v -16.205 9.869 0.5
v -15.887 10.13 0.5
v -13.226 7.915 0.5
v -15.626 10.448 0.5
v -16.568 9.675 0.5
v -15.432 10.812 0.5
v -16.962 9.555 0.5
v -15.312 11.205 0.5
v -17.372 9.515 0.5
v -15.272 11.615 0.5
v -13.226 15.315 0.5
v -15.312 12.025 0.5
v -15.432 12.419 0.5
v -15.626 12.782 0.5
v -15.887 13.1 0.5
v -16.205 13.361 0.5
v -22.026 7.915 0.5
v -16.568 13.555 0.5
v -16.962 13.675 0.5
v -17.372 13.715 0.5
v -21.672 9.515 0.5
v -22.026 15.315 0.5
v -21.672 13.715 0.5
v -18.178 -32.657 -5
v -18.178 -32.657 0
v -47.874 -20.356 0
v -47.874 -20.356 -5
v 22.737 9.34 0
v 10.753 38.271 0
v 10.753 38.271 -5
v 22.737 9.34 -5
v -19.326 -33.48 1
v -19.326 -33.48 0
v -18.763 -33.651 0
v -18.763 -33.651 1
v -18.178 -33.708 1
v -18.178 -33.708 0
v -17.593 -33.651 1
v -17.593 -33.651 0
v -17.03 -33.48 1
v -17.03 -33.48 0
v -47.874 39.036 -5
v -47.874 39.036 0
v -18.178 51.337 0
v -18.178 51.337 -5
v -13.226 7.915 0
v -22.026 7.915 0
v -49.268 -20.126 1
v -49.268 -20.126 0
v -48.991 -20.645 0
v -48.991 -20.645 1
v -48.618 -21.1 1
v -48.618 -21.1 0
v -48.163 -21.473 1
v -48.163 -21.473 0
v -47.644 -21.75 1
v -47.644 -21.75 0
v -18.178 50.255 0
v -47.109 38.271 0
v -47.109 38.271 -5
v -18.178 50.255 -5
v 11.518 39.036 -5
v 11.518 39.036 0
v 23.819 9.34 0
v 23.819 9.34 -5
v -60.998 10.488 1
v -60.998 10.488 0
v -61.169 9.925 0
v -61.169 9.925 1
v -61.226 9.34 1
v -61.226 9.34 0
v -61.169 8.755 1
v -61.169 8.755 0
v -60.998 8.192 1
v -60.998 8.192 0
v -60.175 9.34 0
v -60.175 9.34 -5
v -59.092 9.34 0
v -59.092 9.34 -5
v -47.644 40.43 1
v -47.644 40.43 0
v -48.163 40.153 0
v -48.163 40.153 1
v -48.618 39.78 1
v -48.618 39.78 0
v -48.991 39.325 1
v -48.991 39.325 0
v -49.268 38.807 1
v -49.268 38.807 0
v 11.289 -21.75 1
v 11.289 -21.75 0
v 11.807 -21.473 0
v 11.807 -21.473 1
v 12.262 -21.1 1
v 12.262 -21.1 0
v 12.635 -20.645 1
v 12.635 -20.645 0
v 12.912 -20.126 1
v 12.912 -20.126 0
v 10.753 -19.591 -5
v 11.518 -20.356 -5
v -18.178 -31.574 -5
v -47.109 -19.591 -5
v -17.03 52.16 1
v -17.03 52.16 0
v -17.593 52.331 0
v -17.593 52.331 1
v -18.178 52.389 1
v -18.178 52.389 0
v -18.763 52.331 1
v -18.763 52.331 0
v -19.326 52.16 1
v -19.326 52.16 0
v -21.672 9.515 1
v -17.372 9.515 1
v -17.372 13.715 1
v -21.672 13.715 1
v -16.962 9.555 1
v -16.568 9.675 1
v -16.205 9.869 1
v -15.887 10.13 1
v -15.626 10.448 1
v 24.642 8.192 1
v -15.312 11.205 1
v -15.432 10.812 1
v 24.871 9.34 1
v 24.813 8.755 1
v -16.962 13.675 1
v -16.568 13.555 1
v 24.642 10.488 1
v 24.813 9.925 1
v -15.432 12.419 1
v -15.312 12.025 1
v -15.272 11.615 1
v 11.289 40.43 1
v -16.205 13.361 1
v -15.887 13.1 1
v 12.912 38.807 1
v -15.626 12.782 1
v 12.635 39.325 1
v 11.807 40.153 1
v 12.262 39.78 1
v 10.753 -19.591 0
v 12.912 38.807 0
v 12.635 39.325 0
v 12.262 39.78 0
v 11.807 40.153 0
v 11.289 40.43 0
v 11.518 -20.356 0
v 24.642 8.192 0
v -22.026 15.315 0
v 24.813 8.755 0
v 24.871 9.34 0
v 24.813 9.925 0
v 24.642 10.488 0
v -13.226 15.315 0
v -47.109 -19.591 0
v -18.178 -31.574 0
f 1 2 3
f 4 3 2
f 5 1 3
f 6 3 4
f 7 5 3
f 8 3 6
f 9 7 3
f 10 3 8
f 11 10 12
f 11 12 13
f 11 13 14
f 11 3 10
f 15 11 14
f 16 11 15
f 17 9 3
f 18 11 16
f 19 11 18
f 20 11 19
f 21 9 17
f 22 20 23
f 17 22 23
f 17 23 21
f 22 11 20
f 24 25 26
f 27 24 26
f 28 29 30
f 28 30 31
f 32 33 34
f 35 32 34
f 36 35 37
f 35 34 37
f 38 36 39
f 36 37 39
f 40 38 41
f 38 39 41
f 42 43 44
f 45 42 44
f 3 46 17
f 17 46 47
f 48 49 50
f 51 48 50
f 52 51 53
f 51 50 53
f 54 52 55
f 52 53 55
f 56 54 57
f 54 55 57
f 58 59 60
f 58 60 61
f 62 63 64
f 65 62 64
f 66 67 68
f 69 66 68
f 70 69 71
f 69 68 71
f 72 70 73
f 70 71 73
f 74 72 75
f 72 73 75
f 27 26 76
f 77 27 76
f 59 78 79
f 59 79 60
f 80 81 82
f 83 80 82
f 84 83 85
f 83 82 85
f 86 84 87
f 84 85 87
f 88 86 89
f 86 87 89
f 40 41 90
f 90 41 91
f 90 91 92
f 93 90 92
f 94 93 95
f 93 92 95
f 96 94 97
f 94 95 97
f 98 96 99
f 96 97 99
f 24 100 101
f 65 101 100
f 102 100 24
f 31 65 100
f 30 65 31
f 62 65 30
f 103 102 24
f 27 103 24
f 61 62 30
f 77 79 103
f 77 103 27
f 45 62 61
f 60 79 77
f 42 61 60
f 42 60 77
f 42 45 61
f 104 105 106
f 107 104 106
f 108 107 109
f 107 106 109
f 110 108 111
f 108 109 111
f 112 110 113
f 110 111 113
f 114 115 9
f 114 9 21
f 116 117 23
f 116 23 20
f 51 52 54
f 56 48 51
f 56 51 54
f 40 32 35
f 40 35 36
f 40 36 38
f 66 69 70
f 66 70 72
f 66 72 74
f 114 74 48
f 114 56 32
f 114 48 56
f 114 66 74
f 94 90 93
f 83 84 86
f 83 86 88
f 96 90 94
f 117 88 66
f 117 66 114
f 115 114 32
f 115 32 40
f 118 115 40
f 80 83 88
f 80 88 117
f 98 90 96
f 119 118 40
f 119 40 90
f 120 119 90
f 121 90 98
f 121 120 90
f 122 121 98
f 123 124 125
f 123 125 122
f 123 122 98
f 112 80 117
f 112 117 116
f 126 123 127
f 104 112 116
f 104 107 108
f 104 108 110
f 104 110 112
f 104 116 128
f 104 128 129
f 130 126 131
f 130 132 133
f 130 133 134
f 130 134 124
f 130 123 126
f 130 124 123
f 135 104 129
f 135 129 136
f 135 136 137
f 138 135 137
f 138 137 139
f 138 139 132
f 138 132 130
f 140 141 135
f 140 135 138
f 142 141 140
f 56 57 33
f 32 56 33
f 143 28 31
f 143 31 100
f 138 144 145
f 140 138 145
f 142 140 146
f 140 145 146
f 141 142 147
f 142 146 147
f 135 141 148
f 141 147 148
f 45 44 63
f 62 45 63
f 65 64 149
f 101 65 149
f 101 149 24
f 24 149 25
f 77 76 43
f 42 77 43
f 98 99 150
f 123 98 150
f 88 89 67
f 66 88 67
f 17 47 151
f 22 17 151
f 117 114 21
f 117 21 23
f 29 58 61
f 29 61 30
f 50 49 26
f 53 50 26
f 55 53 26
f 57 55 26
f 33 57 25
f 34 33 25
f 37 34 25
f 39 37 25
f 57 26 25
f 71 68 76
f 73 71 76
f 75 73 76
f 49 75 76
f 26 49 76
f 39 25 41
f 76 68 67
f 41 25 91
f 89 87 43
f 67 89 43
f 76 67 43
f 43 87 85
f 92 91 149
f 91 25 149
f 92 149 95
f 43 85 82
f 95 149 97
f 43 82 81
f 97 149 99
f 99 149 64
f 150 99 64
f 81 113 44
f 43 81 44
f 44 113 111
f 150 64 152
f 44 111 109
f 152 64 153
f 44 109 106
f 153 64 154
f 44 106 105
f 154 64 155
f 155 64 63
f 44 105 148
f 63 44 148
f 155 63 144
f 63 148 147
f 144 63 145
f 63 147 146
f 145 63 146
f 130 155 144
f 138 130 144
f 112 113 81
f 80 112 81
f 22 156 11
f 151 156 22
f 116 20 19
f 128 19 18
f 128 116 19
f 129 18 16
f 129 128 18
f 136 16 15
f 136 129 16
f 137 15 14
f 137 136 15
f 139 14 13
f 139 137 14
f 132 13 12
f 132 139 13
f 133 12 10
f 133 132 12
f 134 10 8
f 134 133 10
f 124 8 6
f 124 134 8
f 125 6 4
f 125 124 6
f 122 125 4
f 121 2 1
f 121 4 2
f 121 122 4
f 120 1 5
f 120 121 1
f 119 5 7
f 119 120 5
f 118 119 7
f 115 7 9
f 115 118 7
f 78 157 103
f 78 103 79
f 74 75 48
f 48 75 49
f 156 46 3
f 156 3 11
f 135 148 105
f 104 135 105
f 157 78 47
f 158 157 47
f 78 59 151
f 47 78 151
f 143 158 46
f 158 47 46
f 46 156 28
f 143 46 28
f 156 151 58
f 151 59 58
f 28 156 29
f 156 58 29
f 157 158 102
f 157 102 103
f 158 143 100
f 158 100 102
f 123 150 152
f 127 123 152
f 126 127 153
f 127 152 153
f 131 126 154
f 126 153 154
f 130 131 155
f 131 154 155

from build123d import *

# Parameters (mm, degrees)
BOSS_EXTRU_1_DEPTH      = 1
ENL_V_MAT_EXTRU_1_DEPTH = 1
BOSS_EXTRU_2_DEPTH      = 5
ESQUISSE4_W             = 8.8
ESQUISSE4_H             = 7.4
ENL_V_MAT_EXTRU_2_DEPTH = 0.5


with BuildPart() as part:
    # Esquisse1 → Boss.-Extru.1 (new body)
    with BuildSketch(Plane.XY):
        with BuildLine():
            Line((-19.325920559, 52.160343492), (-47.644494554, 40.430406076))
            ThreePointArc((-47.644494554, 40.430406076), (-48.617764601, 39.780087822), (-49.268082855, 38.806817776))
            Line((-49.268082855, 38.806817776), (-60.99802027, 10.488243781))
            ThreePointArc((-60.99802027, 10.488243781), (-61.226381673, 9.340193484), (-60.99802027, 8.192143187))
            Line((-60.99802027, 8.192143187), (-49.268082855, -20.126430808))
            ThreePointArc((-49.268082855, -20.126430808), (-48.617764601, -21.099700855), (-47.644494554, -21.750019109))
            Line((-47.644494554, -21.750019109), (-19.325920559, -33.479956525))
            ThreePointArc((-19.325920559, -33.479956525), (-18.177870262, -33.708317927), (-17.029819965, -33.479956525))
            Line((-17.029819965, -33.479956525), (11.28875403, -21.750019109))
            ThreePointArc((11.28875403, -21.750019109), (12.262024077, -21.099700855), (12.912342331, -20.126430808))
            Line((12.912342331, -20.126430808), (24.642279746, 8.192143187))
            ThreePointArc((24.642279746, 8.192143187), (24.870641149, 9.340193484), (24.642279746, 10.488243781))
            Line((24.642279746, 10.488243781), (12.912342331, 38.806817776))
            ThreePointArc((12.912342331, 38.806817776), (12.262024077, 39.780087822), (11.28875403, 40.430406076))
            Line((11.28875403, 40.430406076), (-17.029819965, 52.160343492))
            ThreePointArc((-17.029819965, 52.160343492), (-18.177870262, 52.388704894), (-19.325920559, 52.160343492))
        make_face()
    extrude(amount=BOSS_EXTRU_1_DEPTH)

    # Esquisse2 → Enlèv. mat.-Extru.1 (cut)
    with BuildSketch(Plane.XY.offset(1)):
        with BuildLine():
            Line((-21.671668776, 13.7151444), (-17.371668776, 13.7151444))
            ThreePointArc((-17.371668776, 13.7151444), (-15.271668776, 11.6151444), (-17.371668776, 9.5151444))
            Line((-17.371668776, 9.5151444), (-21.671668776, 9.5151444))
            Line((-21.671668776, 9.5151444), (-21.671668776, 13.7151444))
        make_face()
    extrude(amount=-ENL_V_MAT_EXTRU_1_DEPTH, mode=Mode.SUBTRACT)

    # Esquisse3 → Boss.-Extru.2 (add)
    with BuildSketch(Plane(origin=(0, 0, 0), x_dir=(-1, 0, 0), z_dir=(0, 0, -1))):
        Polygon((47.874104614, 39.036427835), (18.177870262, 51.337010855), (-11.51836409, 39.036427835), (-23.818947109, 9.340193484), (-11.51836409, -20.356040868), (18.177870262, -32.656623888), (47.874104614, -20.356040868), (60.174687633, 9.340193484), align=None)
        Polygon((47.108737749, 38.27106097), (18.177870262, 50.254618655), (-10.752997225, 38.27106097), (-22.736554909, 9.340193484), (-10.752997225, -19.590674003), (18.177870262, -31.574231687), (47.108737749, -19.590674003), (59.092295433, 9.340193484), align=None, mode=Mode.SUBTRACT)
    extrude(amount=BOSS_EXTRU_2_DEPTH)

    # Esquisse4 → Enlèv. mat.-Extru.2 (cut)
    with BuildSketch(Plane(origin=(0, 0, 0), x_dir=(-1, 0, 0), z_dir=(0, 0, -1))):
        with Locations((17.626428794, 11.6151444)):
            Rectangle(ESQUISSE4_W, ESQUISSE4_H)
    extrude(amount=-ENL_V_MAT_EXTRU_2_DEPTH, mode=Mode.SUBTRACT)


solid = part.part
